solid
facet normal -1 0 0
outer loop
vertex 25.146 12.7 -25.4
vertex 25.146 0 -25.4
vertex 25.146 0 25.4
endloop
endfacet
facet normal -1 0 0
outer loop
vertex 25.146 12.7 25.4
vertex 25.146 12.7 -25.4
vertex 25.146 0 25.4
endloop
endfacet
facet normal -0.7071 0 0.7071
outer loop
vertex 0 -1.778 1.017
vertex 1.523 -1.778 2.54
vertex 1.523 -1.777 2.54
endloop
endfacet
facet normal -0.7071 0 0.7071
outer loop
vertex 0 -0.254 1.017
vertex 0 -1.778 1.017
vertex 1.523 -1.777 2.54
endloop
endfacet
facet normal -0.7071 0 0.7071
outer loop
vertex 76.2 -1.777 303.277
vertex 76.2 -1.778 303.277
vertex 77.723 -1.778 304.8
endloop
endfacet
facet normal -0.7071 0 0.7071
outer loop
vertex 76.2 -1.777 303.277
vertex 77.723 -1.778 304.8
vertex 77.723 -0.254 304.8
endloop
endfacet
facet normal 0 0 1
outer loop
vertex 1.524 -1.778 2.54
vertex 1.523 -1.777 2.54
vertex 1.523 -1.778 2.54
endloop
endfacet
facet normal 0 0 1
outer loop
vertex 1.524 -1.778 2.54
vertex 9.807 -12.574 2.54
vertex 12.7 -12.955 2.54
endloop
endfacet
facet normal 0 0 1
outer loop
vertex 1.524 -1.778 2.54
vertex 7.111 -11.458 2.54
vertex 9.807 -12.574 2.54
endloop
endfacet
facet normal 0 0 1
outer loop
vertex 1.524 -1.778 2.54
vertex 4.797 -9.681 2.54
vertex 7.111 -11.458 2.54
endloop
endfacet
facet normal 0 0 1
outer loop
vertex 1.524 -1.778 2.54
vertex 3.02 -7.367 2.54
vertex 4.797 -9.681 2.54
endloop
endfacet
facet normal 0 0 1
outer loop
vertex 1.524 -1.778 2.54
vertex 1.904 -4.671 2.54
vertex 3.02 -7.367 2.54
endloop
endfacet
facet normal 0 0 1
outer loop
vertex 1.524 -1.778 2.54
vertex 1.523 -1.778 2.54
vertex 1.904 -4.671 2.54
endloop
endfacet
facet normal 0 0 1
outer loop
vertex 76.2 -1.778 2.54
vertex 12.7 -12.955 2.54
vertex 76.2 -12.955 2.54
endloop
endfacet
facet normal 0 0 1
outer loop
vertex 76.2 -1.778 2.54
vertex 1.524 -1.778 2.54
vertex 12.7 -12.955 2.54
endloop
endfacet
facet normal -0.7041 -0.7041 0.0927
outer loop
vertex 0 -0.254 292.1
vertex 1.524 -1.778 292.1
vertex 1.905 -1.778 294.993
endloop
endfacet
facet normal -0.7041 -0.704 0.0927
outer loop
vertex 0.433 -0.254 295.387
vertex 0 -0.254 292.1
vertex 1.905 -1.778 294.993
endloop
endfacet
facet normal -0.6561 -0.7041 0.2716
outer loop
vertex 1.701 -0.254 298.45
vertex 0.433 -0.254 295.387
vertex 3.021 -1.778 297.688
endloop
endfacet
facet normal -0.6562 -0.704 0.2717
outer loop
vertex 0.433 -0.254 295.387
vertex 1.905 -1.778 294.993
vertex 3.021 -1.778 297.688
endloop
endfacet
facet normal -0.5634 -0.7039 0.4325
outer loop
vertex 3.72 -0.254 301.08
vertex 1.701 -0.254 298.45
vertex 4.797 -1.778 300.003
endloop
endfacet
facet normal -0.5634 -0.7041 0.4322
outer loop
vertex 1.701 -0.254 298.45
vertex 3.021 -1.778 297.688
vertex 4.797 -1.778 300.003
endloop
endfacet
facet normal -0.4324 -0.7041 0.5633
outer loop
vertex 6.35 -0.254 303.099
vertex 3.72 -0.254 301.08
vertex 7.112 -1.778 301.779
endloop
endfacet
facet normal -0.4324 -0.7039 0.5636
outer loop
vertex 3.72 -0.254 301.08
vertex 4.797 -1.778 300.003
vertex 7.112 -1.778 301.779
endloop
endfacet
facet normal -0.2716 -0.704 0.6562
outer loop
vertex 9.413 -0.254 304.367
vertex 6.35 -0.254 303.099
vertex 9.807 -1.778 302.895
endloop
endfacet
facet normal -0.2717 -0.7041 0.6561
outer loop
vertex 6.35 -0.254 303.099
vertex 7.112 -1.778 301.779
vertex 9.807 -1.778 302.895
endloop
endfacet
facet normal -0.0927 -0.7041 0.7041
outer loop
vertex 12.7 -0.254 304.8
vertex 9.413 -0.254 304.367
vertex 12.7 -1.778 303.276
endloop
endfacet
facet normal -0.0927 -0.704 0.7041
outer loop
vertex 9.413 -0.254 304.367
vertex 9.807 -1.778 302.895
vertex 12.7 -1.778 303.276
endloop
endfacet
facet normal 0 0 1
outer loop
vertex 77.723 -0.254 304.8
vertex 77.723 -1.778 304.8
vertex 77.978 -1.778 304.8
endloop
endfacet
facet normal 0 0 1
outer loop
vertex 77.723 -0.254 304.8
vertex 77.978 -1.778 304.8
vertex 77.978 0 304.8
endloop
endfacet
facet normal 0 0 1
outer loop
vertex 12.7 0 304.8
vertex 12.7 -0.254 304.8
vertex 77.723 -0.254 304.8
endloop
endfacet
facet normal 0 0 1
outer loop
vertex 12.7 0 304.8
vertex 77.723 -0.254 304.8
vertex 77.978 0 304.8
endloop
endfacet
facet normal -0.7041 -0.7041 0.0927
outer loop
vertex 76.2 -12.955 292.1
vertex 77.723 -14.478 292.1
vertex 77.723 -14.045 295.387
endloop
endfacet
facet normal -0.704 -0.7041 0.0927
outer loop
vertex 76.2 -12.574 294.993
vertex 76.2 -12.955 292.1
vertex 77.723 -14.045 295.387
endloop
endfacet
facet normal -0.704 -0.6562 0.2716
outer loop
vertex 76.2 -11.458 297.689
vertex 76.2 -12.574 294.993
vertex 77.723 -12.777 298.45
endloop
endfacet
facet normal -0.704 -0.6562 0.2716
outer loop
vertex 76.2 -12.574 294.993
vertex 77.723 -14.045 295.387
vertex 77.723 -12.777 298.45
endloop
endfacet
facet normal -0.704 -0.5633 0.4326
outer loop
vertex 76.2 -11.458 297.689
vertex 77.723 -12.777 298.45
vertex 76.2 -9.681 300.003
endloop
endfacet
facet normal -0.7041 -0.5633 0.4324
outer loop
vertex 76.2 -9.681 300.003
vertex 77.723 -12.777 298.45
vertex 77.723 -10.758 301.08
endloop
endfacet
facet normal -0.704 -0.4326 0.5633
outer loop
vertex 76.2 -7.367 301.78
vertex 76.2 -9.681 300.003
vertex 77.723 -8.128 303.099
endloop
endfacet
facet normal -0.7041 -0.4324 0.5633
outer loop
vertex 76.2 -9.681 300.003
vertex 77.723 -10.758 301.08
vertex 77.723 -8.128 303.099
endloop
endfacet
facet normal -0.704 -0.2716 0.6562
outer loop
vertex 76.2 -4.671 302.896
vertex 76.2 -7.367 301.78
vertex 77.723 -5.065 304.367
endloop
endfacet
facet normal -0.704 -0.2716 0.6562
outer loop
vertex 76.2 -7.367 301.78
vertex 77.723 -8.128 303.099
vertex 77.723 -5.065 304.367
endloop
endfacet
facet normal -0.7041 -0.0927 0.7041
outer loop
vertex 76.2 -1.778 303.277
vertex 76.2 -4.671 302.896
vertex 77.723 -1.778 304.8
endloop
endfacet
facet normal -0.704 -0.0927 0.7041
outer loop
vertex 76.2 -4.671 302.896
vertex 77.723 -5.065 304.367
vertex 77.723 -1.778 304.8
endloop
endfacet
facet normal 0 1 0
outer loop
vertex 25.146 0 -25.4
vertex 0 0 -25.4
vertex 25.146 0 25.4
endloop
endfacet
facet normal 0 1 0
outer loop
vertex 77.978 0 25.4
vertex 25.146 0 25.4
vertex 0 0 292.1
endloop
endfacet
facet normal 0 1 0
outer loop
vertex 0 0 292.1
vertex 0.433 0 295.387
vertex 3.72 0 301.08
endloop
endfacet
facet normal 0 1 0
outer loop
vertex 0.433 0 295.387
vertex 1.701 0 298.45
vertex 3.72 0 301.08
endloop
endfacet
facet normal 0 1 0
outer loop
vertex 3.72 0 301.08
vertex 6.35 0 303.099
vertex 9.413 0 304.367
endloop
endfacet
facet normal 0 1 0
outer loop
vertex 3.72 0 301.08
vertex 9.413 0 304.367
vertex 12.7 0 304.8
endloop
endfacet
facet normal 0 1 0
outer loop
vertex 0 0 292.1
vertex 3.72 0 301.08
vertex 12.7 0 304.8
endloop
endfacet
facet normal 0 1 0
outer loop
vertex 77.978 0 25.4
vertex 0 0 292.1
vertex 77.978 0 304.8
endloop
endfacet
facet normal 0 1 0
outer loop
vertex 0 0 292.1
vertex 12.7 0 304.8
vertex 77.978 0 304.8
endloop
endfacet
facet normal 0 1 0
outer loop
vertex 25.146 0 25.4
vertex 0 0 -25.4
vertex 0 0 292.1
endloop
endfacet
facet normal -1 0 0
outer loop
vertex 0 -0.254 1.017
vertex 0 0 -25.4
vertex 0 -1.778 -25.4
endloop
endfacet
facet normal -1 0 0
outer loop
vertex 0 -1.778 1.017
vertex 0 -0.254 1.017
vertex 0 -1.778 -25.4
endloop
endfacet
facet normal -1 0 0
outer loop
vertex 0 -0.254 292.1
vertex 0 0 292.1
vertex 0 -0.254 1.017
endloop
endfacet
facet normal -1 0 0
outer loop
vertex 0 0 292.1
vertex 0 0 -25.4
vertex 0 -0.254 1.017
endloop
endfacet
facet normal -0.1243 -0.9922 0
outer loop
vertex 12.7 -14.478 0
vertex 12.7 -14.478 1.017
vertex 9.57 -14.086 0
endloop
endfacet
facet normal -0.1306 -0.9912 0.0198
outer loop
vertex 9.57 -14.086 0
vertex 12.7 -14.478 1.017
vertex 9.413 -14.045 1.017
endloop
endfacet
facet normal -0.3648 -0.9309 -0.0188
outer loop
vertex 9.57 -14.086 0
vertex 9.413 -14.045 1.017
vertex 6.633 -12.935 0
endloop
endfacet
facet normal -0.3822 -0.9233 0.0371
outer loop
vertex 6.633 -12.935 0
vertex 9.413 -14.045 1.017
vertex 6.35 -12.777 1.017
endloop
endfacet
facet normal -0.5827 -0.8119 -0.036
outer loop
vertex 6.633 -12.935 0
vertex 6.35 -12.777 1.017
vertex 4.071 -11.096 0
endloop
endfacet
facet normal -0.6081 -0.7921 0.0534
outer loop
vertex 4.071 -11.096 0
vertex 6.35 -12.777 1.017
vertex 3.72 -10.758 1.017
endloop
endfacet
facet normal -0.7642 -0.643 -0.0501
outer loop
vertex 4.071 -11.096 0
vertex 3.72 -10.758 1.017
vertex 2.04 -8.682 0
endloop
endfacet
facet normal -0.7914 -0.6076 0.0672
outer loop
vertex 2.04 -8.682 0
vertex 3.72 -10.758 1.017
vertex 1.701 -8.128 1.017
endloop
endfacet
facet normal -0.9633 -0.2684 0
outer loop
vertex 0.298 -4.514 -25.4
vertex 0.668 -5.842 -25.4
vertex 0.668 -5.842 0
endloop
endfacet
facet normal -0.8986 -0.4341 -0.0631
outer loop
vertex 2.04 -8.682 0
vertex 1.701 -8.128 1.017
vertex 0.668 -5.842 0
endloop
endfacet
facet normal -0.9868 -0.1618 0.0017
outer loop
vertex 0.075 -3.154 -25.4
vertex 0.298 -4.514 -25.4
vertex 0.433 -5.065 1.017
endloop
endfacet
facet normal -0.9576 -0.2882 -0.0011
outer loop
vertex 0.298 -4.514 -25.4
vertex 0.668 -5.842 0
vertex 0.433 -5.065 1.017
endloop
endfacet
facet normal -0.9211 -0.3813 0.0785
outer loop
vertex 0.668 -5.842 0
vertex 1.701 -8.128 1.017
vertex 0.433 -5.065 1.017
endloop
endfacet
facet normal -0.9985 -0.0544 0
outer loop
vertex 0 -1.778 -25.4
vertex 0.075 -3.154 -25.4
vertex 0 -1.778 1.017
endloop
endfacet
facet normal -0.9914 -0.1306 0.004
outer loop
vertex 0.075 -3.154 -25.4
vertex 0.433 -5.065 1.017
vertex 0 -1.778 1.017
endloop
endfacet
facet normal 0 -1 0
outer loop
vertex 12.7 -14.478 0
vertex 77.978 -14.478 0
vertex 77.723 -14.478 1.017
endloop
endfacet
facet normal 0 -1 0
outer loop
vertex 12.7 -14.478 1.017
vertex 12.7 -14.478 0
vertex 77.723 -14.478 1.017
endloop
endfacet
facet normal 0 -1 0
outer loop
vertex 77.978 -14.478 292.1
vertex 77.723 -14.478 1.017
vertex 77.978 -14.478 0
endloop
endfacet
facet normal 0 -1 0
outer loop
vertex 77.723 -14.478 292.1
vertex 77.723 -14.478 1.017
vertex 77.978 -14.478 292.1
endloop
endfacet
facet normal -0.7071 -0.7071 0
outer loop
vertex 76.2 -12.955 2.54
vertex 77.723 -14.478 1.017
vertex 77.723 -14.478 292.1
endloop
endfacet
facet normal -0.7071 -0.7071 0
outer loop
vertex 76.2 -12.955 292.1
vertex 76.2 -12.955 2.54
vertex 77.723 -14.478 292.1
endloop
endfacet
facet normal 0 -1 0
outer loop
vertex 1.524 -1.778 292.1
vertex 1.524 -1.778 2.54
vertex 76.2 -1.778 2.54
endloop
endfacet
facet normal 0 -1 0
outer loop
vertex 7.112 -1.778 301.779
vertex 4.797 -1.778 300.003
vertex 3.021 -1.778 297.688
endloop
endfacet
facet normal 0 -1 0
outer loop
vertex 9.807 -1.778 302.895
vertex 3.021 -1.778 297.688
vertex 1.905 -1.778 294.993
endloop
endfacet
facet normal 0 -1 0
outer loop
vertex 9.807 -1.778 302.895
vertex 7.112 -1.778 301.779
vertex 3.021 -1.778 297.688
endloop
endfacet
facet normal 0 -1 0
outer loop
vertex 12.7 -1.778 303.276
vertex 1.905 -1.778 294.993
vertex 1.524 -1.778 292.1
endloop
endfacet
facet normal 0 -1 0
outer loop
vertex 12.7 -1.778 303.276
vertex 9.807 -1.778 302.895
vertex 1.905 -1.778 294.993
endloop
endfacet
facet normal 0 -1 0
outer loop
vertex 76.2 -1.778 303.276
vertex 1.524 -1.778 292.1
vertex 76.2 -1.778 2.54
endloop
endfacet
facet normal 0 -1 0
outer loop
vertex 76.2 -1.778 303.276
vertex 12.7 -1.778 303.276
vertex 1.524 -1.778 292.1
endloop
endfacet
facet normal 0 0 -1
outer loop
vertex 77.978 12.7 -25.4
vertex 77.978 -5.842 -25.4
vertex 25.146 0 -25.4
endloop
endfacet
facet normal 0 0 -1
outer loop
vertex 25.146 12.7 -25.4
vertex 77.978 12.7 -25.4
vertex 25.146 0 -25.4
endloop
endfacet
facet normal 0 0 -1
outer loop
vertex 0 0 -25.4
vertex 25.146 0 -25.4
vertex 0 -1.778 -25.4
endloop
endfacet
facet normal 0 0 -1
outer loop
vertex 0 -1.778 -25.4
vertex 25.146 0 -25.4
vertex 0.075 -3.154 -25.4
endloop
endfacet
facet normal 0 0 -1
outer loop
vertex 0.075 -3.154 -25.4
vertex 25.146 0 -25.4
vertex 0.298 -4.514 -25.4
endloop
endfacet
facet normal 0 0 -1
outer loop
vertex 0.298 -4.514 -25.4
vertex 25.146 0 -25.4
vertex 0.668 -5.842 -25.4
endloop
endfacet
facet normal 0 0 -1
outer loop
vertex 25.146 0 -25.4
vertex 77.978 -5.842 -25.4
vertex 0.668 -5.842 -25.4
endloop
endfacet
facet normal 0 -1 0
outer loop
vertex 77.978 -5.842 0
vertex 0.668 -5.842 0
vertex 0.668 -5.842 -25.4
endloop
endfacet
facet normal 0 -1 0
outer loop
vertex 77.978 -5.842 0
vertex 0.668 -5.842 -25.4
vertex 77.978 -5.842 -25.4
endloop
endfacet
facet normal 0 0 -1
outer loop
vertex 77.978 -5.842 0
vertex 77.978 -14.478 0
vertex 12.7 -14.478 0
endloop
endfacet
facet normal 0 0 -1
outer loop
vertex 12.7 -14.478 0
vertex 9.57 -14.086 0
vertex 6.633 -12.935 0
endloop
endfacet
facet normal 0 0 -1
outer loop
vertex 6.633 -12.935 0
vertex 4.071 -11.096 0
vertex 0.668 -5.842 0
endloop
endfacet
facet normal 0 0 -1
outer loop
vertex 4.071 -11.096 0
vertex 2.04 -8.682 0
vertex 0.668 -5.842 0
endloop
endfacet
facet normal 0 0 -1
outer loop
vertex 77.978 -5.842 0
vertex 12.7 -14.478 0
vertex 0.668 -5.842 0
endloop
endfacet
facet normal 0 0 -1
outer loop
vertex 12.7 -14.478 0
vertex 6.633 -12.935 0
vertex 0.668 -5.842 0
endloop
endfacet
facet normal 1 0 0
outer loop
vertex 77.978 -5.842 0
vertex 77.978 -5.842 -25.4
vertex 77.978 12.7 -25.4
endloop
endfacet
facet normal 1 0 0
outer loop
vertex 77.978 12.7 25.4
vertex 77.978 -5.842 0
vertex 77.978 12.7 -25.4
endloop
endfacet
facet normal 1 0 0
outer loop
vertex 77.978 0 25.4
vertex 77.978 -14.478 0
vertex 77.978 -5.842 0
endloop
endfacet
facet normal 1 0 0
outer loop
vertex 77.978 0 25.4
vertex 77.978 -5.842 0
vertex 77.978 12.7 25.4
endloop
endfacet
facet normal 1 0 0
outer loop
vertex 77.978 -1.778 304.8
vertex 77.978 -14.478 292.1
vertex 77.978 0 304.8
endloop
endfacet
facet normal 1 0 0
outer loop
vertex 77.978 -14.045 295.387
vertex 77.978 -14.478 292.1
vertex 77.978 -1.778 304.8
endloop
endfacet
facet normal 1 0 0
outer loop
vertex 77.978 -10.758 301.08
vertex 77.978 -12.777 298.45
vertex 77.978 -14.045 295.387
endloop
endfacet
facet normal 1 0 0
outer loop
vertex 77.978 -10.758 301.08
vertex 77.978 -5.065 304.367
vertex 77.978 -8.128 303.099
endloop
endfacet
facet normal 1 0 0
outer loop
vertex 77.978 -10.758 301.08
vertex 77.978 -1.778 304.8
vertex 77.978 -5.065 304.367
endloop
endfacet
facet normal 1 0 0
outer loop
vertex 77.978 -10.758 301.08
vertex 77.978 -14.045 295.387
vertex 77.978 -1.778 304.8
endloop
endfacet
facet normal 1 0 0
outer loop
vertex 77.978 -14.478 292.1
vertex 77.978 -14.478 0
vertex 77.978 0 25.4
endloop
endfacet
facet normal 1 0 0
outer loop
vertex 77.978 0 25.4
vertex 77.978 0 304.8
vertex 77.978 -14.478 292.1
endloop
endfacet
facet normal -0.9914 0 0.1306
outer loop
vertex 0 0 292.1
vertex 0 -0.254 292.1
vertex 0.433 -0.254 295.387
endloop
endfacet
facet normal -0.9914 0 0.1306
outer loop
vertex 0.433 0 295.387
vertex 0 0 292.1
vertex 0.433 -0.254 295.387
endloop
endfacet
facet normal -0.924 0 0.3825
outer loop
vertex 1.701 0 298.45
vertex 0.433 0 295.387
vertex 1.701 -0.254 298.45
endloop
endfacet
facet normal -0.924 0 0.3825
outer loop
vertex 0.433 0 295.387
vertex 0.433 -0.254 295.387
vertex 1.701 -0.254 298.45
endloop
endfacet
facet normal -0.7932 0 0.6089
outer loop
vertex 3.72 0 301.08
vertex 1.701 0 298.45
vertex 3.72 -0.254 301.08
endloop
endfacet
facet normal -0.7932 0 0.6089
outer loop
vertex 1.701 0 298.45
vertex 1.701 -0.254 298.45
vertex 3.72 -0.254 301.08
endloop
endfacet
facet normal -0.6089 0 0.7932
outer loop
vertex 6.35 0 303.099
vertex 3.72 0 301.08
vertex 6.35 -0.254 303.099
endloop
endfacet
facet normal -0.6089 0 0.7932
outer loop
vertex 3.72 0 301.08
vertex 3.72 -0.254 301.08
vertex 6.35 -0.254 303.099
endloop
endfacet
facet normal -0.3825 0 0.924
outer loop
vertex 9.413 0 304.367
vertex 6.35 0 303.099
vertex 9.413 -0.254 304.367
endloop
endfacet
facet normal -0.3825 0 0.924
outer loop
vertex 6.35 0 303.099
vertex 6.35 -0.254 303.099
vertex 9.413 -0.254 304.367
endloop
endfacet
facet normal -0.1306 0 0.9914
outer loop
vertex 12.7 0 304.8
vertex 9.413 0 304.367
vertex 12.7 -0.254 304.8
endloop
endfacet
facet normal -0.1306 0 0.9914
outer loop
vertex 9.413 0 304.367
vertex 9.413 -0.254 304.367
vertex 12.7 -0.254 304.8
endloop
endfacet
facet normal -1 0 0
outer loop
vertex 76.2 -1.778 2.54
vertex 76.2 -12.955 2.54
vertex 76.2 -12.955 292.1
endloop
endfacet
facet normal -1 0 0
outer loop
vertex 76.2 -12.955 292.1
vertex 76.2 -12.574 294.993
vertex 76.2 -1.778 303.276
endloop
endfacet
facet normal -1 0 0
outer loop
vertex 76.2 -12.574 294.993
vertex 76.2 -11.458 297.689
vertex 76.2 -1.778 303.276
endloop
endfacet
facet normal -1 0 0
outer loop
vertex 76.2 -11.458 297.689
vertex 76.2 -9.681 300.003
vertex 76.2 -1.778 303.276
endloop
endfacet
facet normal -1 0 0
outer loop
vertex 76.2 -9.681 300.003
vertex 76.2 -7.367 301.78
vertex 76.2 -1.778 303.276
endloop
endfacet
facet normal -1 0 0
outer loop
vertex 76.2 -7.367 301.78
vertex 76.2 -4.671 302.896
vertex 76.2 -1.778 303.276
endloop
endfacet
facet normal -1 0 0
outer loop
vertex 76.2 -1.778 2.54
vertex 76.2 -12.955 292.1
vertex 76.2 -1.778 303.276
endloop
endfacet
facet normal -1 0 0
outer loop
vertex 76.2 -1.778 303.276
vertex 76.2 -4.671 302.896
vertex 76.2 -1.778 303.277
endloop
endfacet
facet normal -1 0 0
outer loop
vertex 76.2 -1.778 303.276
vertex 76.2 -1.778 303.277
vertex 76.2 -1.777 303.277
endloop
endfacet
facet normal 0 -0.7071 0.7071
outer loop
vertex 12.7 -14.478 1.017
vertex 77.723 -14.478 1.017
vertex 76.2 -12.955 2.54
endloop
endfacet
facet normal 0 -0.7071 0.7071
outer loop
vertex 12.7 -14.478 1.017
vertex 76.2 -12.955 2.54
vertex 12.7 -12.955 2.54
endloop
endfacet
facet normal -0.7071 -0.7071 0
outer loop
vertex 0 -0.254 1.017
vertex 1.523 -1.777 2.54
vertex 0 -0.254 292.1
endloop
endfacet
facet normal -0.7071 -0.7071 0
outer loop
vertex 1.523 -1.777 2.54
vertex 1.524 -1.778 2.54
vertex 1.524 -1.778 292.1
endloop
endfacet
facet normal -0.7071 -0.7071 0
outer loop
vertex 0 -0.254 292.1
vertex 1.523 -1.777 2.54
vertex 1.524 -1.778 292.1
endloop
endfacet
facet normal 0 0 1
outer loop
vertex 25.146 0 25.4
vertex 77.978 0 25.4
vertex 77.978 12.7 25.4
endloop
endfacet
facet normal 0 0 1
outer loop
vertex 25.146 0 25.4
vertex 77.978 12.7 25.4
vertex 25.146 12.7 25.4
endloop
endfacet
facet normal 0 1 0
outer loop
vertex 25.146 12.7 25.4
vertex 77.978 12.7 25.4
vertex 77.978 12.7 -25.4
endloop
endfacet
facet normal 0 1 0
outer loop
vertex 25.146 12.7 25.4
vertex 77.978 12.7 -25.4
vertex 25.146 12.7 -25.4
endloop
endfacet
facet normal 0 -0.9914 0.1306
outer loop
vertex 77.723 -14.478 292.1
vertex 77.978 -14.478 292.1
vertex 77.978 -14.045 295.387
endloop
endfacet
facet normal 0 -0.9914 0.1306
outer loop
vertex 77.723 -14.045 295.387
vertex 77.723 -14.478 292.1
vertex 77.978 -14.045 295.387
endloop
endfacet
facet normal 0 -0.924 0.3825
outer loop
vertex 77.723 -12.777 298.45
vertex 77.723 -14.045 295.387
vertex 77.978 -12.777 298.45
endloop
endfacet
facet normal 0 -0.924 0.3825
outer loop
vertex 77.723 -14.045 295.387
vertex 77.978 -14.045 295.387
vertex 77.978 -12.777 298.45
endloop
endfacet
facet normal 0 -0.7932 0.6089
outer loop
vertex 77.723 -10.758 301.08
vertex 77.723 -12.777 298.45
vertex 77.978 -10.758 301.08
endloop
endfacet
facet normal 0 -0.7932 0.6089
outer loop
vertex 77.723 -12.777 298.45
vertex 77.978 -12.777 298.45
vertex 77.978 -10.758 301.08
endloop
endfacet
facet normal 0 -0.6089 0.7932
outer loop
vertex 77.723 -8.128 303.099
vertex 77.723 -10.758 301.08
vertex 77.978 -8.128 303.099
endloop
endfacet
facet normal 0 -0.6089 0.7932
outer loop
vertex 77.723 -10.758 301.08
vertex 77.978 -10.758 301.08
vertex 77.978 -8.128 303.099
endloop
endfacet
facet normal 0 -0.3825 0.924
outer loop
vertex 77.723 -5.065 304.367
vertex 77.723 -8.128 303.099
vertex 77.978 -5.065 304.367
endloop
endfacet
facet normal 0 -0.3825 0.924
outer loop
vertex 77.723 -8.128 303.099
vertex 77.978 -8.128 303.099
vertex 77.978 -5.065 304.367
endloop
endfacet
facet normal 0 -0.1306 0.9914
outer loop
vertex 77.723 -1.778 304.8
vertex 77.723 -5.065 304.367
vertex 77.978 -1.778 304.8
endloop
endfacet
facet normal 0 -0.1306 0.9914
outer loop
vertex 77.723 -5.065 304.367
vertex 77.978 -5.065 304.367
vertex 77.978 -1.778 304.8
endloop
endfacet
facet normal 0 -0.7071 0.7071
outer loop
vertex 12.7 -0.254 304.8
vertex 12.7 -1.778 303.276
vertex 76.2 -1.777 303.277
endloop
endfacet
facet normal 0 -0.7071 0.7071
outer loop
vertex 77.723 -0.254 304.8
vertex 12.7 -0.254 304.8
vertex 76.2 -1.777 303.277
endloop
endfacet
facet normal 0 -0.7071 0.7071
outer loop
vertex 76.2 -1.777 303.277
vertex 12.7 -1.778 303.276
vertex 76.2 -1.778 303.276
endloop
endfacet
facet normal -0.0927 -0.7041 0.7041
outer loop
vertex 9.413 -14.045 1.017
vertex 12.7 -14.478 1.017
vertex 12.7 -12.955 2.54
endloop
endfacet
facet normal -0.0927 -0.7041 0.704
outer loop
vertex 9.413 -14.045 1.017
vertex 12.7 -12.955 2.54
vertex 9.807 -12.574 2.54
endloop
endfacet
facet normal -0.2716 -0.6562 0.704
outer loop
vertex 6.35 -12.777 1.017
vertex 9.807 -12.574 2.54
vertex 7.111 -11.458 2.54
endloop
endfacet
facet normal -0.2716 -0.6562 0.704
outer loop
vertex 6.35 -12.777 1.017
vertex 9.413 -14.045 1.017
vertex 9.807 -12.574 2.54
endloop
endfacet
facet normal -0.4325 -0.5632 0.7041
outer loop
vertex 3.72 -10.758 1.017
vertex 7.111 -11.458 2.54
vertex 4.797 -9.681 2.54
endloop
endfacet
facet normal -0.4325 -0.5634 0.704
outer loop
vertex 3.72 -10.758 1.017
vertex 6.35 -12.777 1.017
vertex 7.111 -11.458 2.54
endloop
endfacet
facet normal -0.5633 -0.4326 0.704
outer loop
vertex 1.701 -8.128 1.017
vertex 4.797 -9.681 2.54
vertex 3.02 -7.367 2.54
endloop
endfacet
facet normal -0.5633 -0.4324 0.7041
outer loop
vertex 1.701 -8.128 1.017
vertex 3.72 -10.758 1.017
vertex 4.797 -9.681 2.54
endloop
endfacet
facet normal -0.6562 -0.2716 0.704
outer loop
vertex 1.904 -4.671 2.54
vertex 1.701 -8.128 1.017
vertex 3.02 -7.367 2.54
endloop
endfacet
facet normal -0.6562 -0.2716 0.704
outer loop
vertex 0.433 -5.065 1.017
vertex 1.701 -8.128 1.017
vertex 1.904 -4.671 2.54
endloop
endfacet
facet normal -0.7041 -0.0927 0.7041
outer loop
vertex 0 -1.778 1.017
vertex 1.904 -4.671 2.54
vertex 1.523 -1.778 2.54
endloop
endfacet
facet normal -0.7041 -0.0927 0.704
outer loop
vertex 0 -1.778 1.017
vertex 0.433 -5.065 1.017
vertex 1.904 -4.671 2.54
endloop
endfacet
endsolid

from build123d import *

# Parameters (mm, degrees)
F0_W      = 76.2
F0_H      = 304.8
F1_DEPTH  = 1.778
F2_W      = 76.2
F2_H      = 2.54
F3_DEPTH  = 12.7
F4_W      = 14.478
F4_H      = 304.8
F5_DEPTH  = 1.778
F4_W_2    = 0.1264255261
F4_H_2    = 0.0905882334
F6_W      = 77.978
F6_H      = 5.842
F7_DEPTH  = 25.4
F8_W      = 52.324
F8_H      = 50.8
F9_DEPTH  = 10.16
F11_W     = 52.832
F11_H     = 50.8
F12_DEPTH = 12.7
F13_R     = 12.7
F14_R     = 12.7
F15_R     = 12.7
F16_SIZE  = 1.524
F17_SIZE  = 1.523


# Not quite as in the source:
# - a fillet or chamfer is up to 0.001 mm smaller than in the source, because OpenCascade refuses the exact size


with BuildPart() as f1:
    # F0 (on Front) → F1 (new body)
    with BuildSketch(Plane.XZ):
        with Locations((38.1, 152.4)):
            Rectangle(F0_W, F0_H)
    extrude(amount=F1_DEPTH)

    # F2 (on face) → F3 (join)
    with BuildSketch(Plane.XZ.offset(1.778)):
        with Locations((38.1, 1.27)):
            Rectangle(F2_W, F2_H)
    extrude(amount=F3_DEPTH)

    # F4 (on face) → F5 (join)
    with BuildSketch(Plane.YZ.offset(76.2)):
        with Locations((-7.239, 152.4)):
            Rectangle(F4_W, F4_H)
    extrude(amount=F5_DEPTH)

    # F6 (on face) → F7 (join)
    with BuildSketch(Plane(origin=(0, 0, 0), x_dir=(1, 0, 0), z_dir=(0, 0, -1))):
        with Locations((38.989, 2.921)):
            Rectangle(F6_W, F6_H)
    extrude(amount=F7_DEPTH)

    # F11 (on face) → F12 (join)
    with BuildSketch(Plane(origin=(0, 0, 0), x_dir=(-1, 0, 0), z_dir=(0, 1, 0))):
        with Locations((-51.562, 0)):
            Rectangle(F11_W, F11_H)
    extrude(amount=F12_DEPTH)

    # F13
    f13_edges = [f1.edges().sort_by_distance(p)[0] for p in [
        (0, -0.889, 304.8),
    ]]
    fillet(f13_edges, radius=F13_R)

    # F14
    f14_edges = [f1.edges().sort_by_distance(p)[0] for p in [
        (77.089, -14.478, 304.8),
    ]]
    fillet(f14_edges, radius=F14_R)

    # F15
    f15_edges = [f1.edges().sort_by_distance(p)[0] for p in [
        (0, -14.478, 1.27),
    ]]
    fillet(f15_edges, radius=F15_R)

    # F16
    f16_edges = [f1.edges().sort_by_distance(p)[0] for p in [
        (0, -1.778, 147.32),
    ]]
    chamfer(f16_edges, length=F16_SIZE)

    # F17 (size 1.524 in the source; OpenCascade refuses exactly that, so slightly less here)
    f17_edges = [f1.edges().sort_by_distance(p)[0] for p in [
        (3.719744, -10.758256, 2.54),
        (44.45, -14.478, 2.54),
        (76.2, -14.478, 147.32),
    ]]
    chamfer(f17_edges, length=F17_SIZE)


with BuildPart() as f5:
    # F4 (on face) → F5, piece 2 (new body)
    with BuildSketch(Plane.YZ.offset(76.2)):
        with Locations((1.1594051612, 0.5721470225)):
            Rectangle(F4_W_2, F4_H_2)
    extrude(amount=F5_DEPTH)


with BuildPart() as f9:
    # F8 (on face) → F9 (new body)
    with BuildSketch(Plane(origin=(0, 0, 0), x_dir=(-1, 0, 0), z_dir=(0, 1, 0))):
        with Locations((-51.816, 0)):
            Rectangle(F8_W, F8_H)
    extrude(amount=F9_DEPTH)


solid = f1.part
